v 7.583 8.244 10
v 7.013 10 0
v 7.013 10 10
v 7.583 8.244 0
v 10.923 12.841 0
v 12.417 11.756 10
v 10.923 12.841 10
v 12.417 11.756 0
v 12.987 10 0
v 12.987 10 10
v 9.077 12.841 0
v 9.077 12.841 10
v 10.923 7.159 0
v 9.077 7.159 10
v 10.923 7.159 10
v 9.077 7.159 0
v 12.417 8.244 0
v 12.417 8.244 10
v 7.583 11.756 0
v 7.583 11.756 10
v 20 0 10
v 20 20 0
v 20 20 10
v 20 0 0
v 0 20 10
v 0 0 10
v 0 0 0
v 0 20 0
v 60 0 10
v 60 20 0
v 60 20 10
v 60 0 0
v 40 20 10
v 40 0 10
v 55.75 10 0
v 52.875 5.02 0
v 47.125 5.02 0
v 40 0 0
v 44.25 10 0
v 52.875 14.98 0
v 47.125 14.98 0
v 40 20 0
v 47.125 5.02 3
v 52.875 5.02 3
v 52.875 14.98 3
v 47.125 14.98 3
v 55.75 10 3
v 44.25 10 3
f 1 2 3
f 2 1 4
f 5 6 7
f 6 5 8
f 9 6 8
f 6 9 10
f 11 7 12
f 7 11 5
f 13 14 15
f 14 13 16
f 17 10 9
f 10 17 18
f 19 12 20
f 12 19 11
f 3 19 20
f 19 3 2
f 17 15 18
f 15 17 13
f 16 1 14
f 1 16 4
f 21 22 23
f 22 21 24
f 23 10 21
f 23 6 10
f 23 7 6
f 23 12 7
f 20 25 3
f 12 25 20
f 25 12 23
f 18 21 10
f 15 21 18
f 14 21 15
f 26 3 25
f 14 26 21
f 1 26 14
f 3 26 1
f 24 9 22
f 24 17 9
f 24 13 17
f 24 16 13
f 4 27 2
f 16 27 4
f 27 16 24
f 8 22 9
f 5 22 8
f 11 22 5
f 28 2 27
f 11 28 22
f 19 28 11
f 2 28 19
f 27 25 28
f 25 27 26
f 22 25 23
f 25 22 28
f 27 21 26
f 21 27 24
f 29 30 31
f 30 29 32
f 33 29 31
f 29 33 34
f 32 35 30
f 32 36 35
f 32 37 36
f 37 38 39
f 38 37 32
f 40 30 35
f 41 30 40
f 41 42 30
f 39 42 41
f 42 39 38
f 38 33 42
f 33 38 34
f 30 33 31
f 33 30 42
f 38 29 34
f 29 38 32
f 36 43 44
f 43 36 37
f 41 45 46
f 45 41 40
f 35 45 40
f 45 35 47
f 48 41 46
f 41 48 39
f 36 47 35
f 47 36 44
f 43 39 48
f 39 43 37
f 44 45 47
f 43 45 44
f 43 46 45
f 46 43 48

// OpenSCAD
use <MCAD/nuts_and_bolts.scad>;

difference(){
	cube([20,20,10]);
	translate([10,10,-1]) boltHole(size=6, length=12);
}

difference(){
	translate([40,0,0]) cube([20,20,10]);
	translate([50,10,-2]) nutHole(size=6);
}
